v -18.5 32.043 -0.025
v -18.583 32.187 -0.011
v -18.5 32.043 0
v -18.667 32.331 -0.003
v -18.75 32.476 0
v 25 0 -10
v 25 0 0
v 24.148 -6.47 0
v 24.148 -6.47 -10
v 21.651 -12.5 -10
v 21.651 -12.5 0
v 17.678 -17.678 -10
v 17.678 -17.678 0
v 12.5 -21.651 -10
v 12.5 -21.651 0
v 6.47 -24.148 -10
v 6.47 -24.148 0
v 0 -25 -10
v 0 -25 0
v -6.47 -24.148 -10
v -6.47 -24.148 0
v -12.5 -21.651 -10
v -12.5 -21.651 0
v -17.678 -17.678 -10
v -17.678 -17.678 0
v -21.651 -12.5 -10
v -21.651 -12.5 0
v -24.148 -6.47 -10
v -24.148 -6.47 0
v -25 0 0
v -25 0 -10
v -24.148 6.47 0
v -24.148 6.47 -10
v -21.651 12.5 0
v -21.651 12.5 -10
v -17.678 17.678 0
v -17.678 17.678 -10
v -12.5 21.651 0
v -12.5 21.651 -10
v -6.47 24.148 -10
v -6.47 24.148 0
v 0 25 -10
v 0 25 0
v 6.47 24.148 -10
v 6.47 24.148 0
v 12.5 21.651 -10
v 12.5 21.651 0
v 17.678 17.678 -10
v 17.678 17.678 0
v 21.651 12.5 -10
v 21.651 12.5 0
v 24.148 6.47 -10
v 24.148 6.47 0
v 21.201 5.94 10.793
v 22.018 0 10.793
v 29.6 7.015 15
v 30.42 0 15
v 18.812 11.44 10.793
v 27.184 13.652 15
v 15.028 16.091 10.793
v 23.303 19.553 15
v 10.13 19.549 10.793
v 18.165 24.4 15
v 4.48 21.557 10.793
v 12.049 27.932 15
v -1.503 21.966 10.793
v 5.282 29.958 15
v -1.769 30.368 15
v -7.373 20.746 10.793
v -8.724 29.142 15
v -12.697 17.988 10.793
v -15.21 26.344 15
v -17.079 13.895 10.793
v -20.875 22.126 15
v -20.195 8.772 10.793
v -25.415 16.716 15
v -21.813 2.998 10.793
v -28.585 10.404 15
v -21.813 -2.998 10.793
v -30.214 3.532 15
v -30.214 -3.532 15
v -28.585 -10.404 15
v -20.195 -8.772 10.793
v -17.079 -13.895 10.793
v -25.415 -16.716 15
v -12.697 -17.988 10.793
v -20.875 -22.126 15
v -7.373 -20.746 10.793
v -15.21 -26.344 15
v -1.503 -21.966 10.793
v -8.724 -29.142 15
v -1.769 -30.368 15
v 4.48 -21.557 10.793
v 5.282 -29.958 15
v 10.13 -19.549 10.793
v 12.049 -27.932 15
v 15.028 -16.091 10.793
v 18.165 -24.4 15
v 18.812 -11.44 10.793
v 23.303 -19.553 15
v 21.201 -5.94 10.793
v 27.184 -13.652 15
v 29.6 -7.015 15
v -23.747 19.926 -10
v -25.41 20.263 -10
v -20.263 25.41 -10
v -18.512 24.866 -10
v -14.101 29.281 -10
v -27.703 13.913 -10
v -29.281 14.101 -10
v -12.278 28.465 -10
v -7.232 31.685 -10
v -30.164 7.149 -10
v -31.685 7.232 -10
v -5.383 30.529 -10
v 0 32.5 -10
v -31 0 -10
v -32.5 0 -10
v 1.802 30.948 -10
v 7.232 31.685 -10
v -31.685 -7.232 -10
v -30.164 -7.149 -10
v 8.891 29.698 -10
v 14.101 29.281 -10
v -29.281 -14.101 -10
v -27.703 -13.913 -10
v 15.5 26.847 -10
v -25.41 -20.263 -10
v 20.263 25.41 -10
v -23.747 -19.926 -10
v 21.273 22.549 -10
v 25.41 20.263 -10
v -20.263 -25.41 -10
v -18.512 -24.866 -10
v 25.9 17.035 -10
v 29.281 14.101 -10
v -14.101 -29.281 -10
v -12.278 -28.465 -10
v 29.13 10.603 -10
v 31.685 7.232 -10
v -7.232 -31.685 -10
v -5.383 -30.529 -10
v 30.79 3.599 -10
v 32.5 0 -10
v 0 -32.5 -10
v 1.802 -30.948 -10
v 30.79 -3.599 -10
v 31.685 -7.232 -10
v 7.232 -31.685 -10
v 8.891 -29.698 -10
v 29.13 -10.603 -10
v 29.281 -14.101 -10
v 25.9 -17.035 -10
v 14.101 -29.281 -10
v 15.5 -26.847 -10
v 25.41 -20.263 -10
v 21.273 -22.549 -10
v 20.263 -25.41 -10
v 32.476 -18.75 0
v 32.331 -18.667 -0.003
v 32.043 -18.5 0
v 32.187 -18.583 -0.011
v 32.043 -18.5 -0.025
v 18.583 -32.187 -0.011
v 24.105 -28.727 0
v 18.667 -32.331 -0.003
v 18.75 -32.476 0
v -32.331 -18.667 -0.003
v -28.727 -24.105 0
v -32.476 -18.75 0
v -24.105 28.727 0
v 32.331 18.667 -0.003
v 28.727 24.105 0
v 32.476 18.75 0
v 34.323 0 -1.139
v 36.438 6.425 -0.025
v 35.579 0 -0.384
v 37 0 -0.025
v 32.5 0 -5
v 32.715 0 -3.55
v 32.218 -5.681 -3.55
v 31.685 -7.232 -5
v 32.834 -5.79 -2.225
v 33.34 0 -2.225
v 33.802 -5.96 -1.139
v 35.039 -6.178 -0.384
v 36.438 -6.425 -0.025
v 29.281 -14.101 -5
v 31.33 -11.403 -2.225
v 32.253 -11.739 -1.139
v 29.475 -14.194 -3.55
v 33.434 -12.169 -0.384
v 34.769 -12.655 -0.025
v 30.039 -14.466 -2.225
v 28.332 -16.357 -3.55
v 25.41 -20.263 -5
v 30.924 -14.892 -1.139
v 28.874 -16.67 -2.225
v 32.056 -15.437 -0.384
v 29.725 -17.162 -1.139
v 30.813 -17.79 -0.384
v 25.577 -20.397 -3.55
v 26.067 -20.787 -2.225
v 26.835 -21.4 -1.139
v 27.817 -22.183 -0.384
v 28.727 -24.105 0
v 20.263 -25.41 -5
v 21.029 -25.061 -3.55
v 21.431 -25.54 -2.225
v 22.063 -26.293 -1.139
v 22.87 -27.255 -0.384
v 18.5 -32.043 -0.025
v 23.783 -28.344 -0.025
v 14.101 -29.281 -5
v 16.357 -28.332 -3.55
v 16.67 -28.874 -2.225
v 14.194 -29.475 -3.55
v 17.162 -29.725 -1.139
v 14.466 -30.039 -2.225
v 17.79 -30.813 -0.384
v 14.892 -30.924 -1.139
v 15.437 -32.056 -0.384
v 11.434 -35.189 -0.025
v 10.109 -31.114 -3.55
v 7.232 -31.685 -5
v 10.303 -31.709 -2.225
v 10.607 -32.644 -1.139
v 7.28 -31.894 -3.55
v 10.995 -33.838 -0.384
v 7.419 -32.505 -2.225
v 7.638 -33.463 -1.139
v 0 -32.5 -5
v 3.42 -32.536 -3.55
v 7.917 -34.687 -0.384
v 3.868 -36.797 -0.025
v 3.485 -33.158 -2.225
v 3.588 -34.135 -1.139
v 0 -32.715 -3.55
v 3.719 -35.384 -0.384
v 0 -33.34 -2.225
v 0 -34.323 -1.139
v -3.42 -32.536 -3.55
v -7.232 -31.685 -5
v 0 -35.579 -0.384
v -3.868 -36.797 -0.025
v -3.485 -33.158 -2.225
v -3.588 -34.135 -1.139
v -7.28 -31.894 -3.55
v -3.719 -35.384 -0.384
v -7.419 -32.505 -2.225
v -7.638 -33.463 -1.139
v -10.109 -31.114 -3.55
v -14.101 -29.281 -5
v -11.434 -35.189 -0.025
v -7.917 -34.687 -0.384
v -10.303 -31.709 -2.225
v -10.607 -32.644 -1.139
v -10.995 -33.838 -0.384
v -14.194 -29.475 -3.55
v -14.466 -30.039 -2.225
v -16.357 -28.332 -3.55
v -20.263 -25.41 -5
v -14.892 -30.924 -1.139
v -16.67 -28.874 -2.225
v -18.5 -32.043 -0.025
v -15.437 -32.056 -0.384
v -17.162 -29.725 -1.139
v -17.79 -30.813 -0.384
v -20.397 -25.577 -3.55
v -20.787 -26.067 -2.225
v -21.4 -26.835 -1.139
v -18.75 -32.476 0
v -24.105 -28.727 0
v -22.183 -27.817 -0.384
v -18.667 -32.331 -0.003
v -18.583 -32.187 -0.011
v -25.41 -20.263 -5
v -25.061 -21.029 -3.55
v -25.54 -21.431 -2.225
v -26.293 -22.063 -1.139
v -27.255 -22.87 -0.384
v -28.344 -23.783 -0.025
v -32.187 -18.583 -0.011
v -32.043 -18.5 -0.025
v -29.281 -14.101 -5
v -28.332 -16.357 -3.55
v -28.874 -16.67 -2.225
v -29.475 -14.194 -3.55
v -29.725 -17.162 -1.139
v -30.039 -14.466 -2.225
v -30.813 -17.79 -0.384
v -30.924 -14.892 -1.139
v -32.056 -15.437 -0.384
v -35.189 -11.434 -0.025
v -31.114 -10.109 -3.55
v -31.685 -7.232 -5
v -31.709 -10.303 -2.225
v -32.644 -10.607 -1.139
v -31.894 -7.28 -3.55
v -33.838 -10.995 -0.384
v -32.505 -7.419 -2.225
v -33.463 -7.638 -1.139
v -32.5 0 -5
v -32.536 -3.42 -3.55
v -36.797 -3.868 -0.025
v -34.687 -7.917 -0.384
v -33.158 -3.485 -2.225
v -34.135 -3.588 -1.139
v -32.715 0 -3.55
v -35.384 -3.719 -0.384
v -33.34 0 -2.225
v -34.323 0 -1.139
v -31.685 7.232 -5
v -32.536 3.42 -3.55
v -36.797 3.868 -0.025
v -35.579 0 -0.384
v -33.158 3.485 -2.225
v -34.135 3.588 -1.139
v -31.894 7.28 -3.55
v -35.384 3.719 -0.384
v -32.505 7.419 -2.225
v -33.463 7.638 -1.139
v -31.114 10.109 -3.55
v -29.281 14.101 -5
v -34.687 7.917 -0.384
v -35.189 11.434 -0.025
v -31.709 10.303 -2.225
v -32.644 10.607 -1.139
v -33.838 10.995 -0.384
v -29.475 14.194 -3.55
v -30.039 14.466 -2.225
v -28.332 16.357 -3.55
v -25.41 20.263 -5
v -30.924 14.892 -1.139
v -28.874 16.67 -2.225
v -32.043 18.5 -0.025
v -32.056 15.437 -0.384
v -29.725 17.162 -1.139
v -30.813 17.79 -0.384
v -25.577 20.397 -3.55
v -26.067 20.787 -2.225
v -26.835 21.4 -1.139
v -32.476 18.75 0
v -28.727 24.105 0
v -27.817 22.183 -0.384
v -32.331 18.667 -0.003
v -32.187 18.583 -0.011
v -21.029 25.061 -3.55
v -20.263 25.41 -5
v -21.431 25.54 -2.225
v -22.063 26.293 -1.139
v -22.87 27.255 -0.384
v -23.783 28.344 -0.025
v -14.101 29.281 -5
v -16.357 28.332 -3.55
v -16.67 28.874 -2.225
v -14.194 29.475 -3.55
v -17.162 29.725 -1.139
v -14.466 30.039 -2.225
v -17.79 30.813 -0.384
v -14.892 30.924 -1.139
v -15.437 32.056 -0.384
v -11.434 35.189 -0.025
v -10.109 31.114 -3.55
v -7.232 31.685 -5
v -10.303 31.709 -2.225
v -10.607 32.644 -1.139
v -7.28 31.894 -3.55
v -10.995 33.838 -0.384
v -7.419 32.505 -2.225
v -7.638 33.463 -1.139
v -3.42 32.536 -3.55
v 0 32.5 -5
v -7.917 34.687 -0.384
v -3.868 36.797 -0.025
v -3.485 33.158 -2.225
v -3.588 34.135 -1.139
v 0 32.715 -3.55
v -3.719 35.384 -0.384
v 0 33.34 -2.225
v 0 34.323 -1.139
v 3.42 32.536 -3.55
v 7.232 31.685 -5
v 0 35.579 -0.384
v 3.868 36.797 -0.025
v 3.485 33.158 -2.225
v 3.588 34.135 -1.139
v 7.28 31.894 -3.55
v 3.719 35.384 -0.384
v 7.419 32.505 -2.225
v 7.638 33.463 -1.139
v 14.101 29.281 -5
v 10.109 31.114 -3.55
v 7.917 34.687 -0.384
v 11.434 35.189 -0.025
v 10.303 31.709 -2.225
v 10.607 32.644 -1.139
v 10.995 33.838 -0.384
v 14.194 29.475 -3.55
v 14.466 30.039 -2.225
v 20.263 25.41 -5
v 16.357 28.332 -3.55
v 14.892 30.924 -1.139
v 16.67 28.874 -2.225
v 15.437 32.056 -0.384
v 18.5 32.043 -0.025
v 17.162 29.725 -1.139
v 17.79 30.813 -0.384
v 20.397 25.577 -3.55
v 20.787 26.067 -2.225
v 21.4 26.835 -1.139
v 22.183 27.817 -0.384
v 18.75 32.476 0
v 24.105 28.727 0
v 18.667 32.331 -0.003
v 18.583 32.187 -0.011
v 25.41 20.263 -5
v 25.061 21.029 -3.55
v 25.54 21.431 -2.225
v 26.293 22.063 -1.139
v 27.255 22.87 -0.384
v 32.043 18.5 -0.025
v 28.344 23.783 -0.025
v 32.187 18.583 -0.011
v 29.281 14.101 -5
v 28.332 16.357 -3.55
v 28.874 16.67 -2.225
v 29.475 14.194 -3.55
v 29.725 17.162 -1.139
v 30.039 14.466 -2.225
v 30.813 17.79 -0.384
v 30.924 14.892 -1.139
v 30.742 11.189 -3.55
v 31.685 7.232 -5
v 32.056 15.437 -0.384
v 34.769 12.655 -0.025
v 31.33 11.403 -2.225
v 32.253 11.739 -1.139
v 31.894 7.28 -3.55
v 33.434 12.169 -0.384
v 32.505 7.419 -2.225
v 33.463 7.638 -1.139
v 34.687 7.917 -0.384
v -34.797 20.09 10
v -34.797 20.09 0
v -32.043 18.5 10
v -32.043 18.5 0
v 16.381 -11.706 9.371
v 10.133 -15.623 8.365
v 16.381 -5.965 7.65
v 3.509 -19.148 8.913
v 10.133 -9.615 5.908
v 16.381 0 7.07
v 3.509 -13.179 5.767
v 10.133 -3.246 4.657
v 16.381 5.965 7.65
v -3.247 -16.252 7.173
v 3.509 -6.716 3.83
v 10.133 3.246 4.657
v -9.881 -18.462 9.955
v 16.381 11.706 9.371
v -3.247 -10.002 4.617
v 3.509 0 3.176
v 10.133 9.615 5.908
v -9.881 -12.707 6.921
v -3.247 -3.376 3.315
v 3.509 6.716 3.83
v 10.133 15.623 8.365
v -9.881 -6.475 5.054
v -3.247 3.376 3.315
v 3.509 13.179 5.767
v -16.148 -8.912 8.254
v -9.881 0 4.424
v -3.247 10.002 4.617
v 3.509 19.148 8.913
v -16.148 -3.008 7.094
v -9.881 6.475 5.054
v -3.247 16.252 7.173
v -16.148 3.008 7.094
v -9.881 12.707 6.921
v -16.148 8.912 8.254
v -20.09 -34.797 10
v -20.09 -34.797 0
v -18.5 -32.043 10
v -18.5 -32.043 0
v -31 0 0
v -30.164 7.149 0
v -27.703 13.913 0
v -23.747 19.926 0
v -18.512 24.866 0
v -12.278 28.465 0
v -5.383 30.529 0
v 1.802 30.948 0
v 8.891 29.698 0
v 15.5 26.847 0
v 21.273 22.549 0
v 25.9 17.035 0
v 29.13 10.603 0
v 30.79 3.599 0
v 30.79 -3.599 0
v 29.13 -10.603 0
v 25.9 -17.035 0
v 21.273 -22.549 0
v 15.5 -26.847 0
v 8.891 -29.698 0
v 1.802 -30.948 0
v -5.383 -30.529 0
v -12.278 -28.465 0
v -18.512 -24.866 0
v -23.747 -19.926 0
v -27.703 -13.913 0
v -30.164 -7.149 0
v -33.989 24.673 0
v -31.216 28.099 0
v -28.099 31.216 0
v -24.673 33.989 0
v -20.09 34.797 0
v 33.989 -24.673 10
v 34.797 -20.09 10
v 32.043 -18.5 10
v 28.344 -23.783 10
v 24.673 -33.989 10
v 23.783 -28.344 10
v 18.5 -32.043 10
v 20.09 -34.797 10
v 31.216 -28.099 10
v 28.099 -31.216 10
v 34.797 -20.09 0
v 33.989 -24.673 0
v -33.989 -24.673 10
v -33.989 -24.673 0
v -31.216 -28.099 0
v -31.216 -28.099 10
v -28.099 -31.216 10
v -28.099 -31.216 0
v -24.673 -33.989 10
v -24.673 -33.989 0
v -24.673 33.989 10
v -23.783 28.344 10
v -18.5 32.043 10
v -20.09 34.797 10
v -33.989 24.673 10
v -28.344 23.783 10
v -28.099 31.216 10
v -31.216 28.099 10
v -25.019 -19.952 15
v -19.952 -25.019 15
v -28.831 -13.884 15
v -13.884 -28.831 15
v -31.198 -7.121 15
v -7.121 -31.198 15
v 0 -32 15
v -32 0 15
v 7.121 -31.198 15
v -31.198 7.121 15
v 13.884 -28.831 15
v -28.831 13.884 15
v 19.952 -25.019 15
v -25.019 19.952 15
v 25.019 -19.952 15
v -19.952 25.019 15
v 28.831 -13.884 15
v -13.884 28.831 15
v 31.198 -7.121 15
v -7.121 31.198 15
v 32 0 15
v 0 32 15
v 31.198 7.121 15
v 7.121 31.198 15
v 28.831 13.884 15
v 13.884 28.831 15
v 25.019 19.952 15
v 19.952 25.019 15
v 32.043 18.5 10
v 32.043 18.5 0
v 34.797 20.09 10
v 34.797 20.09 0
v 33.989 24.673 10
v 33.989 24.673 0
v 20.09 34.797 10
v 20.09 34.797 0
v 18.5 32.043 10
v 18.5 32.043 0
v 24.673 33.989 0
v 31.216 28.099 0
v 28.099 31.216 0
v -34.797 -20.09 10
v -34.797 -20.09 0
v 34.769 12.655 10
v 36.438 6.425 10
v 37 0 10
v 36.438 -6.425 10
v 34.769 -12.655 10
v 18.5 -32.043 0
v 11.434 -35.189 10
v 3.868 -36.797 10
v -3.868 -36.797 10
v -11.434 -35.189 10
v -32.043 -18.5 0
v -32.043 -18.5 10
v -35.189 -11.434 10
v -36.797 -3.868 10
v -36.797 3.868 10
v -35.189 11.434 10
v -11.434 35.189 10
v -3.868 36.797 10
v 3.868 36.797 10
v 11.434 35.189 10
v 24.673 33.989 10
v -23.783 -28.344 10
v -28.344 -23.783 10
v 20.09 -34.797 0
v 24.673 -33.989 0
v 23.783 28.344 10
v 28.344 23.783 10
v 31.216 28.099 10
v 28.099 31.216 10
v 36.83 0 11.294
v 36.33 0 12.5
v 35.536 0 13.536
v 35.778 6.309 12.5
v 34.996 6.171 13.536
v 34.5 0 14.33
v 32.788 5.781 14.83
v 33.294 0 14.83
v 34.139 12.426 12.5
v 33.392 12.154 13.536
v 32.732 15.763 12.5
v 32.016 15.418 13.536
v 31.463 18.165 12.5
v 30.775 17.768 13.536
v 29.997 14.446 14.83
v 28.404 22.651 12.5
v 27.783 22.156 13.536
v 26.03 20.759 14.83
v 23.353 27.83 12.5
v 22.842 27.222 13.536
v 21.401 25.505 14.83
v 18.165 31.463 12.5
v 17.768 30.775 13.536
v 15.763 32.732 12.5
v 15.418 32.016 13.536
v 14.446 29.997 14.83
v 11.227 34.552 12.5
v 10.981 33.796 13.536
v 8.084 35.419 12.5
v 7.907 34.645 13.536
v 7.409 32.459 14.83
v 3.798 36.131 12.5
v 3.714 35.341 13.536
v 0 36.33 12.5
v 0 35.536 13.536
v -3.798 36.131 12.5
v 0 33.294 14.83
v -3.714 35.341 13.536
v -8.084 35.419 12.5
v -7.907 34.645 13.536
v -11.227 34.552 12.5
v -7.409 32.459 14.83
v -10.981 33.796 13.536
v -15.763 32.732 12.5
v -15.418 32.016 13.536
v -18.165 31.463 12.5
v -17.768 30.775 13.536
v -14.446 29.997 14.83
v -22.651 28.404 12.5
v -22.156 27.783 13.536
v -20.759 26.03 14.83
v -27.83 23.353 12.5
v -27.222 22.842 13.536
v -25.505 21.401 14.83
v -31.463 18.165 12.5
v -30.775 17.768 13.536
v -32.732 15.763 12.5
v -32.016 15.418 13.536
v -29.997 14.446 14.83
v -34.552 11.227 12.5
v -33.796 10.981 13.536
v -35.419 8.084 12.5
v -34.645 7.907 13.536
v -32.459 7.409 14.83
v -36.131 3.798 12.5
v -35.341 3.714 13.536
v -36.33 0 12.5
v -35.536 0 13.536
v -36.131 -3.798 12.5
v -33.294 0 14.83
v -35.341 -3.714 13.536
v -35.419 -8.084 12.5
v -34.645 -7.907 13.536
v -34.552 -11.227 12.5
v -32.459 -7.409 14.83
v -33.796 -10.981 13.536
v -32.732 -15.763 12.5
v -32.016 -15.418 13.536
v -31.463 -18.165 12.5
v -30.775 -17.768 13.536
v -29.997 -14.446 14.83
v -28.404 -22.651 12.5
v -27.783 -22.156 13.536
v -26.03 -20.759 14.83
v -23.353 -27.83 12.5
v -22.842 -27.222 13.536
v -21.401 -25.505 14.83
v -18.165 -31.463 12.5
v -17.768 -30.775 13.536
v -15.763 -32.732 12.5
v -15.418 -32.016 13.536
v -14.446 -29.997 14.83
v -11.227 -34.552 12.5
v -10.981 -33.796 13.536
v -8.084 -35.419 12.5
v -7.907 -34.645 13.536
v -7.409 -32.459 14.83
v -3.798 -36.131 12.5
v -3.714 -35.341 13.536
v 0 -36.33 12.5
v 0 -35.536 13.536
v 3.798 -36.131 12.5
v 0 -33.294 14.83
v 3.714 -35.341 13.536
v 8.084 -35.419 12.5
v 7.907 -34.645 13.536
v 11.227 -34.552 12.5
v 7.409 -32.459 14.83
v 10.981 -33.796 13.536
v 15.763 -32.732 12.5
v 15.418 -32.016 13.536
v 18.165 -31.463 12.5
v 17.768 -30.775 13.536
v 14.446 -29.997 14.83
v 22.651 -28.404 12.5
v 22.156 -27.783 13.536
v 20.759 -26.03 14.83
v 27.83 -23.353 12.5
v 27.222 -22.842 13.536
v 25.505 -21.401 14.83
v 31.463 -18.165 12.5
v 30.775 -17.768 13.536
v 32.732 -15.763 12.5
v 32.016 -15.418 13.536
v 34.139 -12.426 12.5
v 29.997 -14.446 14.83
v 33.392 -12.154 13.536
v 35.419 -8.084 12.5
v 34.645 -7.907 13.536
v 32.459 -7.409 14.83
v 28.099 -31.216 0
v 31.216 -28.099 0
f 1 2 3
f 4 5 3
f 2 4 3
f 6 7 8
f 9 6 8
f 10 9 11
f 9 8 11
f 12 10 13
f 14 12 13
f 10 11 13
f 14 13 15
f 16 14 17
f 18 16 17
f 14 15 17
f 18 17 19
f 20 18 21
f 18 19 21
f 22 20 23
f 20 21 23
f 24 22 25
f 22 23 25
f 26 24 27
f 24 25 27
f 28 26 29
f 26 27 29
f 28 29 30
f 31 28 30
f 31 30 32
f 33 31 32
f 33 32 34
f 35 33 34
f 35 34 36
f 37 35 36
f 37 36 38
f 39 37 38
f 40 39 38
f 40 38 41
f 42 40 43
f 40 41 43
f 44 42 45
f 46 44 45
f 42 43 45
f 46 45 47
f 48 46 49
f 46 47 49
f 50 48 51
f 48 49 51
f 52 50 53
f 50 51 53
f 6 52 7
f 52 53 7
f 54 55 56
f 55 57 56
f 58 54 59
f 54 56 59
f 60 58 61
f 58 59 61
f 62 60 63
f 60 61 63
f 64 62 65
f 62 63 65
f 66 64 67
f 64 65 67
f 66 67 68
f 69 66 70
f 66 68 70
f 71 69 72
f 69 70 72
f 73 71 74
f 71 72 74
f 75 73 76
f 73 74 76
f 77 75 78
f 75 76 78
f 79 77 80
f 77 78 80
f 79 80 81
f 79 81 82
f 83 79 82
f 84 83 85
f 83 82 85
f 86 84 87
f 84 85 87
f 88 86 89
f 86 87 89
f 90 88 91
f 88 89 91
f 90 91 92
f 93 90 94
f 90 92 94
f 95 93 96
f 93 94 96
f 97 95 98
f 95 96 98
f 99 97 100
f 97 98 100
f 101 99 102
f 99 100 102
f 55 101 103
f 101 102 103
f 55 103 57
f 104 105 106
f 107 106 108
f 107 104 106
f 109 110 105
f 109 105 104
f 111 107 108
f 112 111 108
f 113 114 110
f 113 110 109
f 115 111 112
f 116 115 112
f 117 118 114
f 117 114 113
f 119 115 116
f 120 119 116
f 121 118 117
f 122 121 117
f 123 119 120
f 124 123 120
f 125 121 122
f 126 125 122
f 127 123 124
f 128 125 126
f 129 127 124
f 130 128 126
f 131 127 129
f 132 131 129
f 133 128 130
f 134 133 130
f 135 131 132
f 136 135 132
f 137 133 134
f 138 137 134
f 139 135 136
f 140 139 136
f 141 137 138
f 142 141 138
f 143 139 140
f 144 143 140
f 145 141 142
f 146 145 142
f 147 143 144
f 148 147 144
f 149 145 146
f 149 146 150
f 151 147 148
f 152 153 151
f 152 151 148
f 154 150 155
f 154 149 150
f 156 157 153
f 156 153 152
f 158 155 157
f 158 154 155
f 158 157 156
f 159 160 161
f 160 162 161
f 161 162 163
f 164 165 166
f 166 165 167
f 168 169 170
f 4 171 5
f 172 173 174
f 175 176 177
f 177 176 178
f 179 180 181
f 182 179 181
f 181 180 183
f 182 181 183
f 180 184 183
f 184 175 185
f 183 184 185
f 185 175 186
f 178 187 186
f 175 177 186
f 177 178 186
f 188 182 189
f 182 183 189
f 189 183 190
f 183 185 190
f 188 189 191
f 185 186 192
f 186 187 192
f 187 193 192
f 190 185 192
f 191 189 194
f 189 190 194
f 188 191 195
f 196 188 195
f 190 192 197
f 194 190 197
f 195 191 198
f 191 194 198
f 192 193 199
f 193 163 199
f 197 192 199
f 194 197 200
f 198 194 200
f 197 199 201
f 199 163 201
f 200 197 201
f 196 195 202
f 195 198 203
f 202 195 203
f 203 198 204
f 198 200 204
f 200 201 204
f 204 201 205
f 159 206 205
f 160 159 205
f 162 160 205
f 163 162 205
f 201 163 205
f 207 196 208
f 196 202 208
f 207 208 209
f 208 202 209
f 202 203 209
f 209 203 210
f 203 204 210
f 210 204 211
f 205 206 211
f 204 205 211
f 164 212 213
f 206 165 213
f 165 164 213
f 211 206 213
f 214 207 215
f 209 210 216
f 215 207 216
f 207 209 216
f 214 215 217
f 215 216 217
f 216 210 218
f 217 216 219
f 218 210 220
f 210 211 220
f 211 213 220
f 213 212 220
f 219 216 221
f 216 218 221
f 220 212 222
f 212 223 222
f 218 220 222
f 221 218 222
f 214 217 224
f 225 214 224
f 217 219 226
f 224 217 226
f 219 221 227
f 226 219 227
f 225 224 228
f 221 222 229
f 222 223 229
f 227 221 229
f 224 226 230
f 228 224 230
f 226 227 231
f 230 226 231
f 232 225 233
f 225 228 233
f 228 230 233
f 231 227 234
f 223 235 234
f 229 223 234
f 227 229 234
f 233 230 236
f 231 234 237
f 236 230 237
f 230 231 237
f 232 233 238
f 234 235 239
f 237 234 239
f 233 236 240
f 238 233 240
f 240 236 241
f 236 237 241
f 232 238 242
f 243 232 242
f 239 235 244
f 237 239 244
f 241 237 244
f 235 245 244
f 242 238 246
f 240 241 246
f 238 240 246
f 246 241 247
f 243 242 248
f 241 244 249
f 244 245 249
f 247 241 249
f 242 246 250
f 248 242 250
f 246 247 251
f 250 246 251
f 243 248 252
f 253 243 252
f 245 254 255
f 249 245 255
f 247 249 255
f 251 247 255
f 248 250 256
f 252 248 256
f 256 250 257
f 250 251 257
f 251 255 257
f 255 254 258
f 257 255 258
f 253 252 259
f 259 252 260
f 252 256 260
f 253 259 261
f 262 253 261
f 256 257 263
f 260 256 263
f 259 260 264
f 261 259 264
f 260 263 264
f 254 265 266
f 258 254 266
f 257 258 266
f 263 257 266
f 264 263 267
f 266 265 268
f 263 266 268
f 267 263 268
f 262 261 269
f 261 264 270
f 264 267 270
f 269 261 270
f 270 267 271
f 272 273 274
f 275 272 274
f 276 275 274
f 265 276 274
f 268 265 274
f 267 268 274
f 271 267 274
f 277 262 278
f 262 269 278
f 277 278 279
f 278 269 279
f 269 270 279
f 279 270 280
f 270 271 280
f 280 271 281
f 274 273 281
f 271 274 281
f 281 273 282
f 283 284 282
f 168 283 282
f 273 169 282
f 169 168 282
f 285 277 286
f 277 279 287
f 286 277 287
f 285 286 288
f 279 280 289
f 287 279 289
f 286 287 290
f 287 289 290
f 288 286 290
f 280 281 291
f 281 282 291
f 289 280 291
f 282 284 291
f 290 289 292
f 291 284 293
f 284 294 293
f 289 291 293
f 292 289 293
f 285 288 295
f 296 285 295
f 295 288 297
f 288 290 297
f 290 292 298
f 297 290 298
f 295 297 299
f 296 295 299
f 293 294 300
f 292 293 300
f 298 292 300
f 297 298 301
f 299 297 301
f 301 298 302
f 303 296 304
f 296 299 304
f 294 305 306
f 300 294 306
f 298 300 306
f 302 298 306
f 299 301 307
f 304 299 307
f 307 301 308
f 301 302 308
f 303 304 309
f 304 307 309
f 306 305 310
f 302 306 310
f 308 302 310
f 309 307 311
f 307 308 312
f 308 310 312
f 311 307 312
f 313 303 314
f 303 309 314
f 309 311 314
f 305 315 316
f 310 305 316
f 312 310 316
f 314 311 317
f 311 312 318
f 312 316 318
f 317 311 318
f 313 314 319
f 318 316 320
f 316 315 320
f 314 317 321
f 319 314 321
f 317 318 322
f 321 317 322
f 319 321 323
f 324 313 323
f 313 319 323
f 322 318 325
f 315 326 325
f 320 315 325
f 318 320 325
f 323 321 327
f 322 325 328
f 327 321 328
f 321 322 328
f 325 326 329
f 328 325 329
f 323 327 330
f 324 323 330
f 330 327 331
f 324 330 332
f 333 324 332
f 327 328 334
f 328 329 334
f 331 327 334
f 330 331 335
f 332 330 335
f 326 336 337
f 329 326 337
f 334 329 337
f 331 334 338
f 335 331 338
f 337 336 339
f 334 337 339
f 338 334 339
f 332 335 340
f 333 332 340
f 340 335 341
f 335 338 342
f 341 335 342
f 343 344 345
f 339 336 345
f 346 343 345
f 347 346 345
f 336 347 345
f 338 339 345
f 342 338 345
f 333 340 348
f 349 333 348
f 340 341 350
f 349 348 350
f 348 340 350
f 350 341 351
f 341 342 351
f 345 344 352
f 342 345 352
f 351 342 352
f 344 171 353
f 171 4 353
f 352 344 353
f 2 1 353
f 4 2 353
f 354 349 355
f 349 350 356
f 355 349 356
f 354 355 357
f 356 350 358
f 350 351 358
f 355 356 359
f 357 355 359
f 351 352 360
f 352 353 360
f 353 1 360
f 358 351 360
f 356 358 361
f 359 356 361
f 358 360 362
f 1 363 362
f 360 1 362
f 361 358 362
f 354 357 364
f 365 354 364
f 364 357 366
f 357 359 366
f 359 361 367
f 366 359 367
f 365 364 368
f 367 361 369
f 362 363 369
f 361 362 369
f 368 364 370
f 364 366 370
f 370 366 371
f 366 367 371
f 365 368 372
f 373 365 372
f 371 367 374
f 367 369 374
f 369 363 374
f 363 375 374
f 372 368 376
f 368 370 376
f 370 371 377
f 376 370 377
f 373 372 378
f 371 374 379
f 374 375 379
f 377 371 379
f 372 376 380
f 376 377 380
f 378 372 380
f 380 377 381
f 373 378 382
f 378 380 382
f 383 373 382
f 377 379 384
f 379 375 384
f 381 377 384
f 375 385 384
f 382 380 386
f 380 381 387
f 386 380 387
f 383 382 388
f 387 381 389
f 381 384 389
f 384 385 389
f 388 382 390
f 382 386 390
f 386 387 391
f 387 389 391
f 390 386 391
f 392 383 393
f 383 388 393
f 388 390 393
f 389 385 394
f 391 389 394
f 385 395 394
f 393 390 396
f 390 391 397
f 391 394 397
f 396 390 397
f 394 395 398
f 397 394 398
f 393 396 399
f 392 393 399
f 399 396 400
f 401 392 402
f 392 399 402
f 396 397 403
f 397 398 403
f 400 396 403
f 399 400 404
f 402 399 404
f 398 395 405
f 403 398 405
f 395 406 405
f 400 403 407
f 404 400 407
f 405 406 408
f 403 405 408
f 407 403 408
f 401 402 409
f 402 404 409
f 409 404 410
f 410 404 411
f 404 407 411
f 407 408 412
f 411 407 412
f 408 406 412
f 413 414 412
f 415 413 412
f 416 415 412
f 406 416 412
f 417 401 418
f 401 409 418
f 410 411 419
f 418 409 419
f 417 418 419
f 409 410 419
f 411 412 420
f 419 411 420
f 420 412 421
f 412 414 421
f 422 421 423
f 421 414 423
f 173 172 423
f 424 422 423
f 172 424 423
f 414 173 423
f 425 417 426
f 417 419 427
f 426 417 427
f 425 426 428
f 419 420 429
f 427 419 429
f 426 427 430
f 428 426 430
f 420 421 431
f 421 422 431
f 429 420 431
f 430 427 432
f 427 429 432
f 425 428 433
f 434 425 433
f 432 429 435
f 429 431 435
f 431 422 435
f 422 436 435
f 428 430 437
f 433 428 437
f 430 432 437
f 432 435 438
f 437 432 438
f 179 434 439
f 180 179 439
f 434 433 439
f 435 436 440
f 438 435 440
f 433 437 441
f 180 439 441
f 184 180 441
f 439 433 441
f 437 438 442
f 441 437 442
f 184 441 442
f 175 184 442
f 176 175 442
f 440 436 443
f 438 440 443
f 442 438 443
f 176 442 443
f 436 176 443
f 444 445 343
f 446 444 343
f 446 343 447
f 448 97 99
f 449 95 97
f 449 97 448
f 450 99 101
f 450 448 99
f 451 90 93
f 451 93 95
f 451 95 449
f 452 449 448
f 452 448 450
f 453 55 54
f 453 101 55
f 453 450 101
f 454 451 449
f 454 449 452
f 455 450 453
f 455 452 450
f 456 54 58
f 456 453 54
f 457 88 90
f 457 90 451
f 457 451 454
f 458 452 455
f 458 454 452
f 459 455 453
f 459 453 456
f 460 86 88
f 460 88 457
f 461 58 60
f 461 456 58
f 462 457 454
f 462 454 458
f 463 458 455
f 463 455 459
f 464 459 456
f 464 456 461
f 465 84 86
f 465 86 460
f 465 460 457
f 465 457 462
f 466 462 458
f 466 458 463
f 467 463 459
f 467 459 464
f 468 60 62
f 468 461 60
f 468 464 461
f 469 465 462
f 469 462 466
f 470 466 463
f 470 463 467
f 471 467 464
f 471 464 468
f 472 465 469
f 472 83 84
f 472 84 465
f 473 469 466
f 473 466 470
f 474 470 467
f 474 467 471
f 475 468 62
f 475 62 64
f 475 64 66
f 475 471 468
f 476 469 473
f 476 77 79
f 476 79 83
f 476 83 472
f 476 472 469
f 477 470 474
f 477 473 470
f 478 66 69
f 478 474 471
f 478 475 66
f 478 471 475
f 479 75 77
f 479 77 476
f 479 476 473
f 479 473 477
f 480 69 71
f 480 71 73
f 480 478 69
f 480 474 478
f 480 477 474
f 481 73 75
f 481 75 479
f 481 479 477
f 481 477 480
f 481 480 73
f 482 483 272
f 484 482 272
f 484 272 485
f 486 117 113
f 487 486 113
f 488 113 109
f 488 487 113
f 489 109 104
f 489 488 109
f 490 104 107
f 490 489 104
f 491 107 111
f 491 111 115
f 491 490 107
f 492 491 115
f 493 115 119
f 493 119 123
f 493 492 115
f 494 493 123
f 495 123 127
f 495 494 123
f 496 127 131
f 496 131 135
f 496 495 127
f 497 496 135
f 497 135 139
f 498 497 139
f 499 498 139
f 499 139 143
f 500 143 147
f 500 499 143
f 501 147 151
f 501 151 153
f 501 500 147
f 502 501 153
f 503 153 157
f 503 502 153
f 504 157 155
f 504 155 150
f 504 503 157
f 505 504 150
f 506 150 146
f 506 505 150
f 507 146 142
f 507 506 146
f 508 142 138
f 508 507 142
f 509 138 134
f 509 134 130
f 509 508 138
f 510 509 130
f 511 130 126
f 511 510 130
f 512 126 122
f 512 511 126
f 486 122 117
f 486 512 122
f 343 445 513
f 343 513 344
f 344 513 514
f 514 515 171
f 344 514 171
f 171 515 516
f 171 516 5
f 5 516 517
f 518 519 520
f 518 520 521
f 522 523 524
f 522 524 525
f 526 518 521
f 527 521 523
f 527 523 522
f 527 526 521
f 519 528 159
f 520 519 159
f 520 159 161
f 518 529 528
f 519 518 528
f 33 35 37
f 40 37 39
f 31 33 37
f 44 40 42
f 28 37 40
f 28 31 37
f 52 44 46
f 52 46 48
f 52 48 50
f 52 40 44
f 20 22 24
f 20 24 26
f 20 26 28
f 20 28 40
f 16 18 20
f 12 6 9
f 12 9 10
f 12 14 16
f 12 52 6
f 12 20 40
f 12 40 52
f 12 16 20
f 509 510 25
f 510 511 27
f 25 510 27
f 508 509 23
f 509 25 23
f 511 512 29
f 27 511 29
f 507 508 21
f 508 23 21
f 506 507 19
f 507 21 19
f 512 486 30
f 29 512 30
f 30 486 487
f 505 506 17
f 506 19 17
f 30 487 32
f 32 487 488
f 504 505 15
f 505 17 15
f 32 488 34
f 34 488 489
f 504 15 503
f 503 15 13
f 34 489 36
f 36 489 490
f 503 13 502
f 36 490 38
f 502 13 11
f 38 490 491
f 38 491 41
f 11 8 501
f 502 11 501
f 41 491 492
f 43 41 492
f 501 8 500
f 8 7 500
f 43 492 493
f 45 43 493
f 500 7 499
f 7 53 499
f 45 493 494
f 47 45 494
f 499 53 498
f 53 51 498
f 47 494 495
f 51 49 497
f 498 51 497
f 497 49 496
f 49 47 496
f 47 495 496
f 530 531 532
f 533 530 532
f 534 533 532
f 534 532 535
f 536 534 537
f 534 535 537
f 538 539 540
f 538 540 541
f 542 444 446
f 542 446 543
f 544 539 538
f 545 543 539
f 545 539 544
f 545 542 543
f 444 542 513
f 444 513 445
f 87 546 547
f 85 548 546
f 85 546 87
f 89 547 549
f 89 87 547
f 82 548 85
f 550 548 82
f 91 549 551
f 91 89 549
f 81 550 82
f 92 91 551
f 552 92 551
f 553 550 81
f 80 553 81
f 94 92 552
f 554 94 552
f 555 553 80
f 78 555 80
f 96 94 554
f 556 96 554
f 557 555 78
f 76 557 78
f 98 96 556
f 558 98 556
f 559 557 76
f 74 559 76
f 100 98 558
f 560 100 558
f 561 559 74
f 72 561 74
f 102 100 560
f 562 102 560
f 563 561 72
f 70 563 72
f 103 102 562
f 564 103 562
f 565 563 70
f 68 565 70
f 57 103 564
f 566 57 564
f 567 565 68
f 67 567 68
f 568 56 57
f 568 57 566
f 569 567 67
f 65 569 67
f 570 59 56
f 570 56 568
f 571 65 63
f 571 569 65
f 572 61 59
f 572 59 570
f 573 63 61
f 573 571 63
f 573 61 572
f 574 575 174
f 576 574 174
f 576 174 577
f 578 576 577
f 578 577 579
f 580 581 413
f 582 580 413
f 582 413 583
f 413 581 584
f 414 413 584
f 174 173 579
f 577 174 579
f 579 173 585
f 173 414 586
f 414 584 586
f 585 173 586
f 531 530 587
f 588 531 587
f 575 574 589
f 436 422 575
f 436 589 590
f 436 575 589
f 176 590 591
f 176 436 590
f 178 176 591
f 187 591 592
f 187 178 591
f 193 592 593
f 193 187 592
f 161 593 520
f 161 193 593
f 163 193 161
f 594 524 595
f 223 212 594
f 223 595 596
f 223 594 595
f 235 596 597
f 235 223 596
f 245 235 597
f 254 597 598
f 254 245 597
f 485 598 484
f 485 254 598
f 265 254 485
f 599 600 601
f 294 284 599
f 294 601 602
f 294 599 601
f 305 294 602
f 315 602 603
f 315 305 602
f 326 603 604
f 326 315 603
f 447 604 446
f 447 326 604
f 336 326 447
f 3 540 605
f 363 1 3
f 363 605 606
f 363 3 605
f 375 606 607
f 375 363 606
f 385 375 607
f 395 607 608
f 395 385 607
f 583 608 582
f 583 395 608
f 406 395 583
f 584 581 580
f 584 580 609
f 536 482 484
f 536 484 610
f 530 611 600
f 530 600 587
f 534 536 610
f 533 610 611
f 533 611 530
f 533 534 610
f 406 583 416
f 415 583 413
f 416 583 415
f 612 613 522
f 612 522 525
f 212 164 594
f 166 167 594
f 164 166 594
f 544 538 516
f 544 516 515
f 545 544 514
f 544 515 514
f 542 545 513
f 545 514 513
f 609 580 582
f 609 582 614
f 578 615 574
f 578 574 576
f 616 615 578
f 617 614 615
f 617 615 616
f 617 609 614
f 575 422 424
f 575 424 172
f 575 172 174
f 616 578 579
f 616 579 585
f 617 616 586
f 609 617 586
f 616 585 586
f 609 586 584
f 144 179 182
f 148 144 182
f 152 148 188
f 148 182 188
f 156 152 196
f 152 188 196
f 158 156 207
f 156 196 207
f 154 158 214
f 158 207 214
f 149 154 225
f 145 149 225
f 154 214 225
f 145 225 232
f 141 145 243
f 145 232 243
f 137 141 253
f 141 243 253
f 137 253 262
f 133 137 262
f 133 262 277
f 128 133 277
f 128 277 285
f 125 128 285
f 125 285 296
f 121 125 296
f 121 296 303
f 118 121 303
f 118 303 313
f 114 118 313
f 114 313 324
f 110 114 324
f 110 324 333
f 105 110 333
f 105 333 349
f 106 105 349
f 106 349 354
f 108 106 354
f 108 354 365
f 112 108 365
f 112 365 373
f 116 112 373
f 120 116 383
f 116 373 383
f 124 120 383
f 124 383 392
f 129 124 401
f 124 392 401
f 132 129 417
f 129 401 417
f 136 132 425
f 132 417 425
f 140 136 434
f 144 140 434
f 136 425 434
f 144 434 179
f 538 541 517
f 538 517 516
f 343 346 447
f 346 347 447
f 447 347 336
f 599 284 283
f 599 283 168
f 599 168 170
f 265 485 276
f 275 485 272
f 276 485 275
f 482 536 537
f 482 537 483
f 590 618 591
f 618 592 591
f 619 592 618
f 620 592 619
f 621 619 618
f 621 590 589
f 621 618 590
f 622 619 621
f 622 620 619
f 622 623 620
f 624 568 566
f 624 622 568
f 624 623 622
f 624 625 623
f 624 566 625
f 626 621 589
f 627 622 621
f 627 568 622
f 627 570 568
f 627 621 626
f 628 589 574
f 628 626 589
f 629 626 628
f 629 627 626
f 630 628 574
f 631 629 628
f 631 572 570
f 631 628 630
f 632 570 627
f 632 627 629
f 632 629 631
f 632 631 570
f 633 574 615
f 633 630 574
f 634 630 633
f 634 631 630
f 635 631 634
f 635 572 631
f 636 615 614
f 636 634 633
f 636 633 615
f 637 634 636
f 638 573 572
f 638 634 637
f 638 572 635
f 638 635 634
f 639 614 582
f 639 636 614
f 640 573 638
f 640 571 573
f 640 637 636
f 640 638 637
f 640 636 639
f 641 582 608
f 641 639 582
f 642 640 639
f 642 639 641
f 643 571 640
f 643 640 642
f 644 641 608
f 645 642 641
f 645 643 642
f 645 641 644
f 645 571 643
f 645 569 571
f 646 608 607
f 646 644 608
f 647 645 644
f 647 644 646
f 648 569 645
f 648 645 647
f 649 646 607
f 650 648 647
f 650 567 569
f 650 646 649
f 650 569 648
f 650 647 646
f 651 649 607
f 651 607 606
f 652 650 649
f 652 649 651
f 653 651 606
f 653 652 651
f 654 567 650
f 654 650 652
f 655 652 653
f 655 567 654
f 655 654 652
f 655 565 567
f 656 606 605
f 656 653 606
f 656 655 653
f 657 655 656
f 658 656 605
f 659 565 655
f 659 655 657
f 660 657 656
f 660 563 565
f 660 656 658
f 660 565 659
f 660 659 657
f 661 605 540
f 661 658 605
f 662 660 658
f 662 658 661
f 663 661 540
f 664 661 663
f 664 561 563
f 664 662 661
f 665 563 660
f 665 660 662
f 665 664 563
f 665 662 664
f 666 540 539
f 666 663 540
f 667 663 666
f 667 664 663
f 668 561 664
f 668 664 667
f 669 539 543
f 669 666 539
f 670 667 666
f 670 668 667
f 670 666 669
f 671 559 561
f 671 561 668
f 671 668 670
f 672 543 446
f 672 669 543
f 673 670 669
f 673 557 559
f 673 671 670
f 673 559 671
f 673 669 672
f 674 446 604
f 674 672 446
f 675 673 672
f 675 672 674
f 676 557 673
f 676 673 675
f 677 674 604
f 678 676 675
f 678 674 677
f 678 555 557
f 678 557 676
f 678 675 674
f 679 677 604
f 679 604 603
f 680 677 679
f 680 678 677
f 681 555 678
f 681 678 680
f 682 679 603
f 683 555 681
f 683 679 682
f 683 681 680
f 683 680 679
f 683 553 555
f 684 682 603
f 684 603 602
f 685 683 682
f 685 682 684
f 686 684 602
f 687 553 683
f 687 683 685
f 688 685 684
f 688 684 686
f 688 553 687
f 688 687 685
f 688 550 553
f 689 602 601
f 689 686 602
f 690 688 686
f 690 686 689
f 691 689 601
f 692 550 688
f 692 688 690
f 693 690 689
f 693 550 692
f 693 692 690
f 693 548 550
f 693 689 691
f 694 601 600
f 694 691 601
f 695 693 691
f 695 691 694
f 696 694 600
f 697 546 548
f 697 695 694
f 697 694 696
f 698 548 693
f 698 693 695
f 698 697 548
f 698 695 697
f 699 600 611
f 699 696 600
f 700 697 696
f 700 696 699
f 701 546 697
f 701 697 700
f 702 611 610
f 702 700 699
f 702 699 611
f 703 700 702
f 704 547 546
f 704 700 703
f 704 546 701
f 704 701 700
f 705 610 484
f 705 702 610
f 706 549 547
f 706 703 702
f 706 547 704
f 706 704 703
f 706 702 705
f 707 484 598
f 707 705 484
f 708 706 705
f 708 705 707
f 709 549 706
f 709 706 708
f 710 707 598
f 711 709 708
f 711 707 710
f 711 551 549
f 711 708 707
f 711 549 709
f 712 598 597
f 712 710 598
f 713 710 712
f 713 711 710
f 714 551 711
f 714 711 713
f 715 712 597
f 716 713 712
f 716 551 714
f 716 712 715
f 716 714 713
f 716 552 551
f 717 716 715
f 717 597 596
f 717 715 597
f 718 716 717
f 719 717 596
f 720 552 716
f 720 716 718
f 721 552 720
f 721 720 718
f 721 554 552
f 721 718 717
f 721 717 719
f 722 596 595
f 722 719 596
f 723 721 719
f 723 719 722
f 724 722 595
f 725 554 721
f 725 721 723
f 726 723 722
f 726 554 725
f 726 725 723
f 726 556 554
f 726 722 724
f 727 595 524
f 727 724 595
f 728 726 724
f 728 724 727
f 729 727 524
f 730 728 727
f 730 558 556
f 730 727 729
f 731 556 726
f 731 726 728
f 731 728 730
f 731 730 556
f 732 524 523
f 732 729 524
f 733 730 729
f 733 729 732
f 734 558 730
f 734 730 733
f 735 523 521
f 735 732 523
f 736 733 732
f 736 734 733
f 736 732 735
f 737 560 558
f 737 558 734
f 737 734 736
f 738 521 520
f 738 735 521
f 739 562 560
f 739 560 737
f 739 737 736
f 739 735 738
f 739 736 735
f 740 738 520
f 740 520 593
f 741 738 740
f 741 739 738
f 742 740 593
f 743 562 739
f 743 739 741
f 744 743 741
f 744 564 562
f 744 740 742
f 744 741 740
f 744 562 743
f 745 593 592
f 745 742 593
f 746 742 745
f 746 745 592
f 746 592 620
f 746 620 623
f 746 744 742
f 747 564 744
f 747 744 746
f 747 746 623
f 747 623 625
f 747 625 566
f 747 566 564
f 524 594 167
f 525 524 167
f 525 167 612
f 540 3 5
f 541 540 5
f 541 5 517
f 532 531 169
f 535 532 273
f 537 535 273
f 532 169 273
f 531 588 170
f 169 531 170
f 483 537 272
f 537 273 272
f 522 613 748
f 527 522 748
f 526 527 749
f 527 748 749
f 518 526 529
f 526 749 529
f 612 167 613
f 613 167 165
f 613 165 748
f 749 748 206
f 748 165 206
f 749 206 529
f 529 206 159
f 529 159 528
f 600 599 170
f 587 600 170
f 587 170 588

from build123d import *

# Parameters (mm, degrees)
SKETCH_1_R                           = 37
EXTRUDE_1_DEPTH                      = 15
FILLET_2_R                           = 5
EXTRUDE_3_DEPTH                      = 10
CHAMFER_2_SIZE                       = 1.819851171
CHAMFER_3_SIZE                       = 1.819851171
PATTERN_CIRCULAR_4_COUNT             = 4
CHAMFER_2_OF_PATTERN_CIRCULAR_4_SIZE = 1.819851171
CHAMFER_3_OF_PATTERN_CIRCULAR_4_SIZE = 1.819851171
SKETCH_9_R                           = 32.5
SKETCH_9_R_2                         = 31
EXTRUDE_4_DEPTH                      = 10
SKETCH_9_3_R                         = 25
EXTRUDE_5_DEPTH                      = 10
FILLET_3_R                           = 5


with BuildPart() as part:
    # 草圖1 → 填料-伸長1 (new body)
    with BuildSketch(Plane.XY):
        Circle(SKETCH_1_R)
    extrude(amount=EXTRUDE_1_DEPTH)

    # 草圖2 → 除料-旋轉2 (revolve, cut)
    with BuildSketch(Plane.XY.offset(38)):
        with BuildLine():
            Line((-35, 0), (35, 0))
            ThreePointArc((35, 0), (0, -35), (-35, 0))
        make_face()
    revolve(axis=Axis((-35, 0, 38), (1, 0, 0)), mode=Mode.SUBTRACT)

    # 導角1: read off the stored shape, not the designer's step
    # 導角1 outline → 導角1 (revolve, cut)
    with BuildSketch(Plane.XZ):
        Polygon((22.017739237, 15), (22.017739237, 10.79303106), (30.419689063, 15), align=None)
    revolve(axis=Axis((0, 0, 0), (0, 0, 1)), mode=Mode.SUBTRACT)

    # 圓角2
    fillet_2_edges = [part.edges().sort_by_distance(p)[0] for p in [
        (-37, 0, 15),
    ]]
    fillet(fillet_2_edges, radius=FILLET_2_R)

    # 草圖8 → 填料-伸長3 (add)
    with BuildSketch(Plane.XY):
        with BuildLine():
            Line((21, 36.373066959), (18.5, 32.04293994))
            ThreePointArc((18.5, 32.04293994), (26.162950904, 26.162950904), (32.04293994, 18.5))
            Line((32.04293994, 18.5), (36.373066959, 21))
            ThreePointArc((36.373066959, 21), (29.69848481, 29.69848481), (21, 36.373066959))
        make_face()
    extrude_3 = extrude(amount=EXTRUDE_3_DEPTH)

    # 導角2
    # the kernel refuses this chamfer: 5, 1.819851171 mm, written as the material it takes off along each edge
    with BuildSketch(Plane(origin=(21, 36.373066959, -11.408988882), x_dir=(-0.5000000000000003, -0.8660254037844385, 0), z_dir=(0, 0, 1))) as chamfer_2_piece_1:
        with BuildLine():
            Line((CHAMFER_2_SIZE, 0), (0.22826162, 4.372856354))
            ThreePointArc((0.22826162, 4.372856354), (0.06200601, 2.281372415), (0, 0))
            Line((0, 0), (CHAMFER_2_SIZE, 0))
        make_face()
    extrude(amount=32.817977764, mode=Mode.SUBTRACT)

    # 導角3
    # the kernel refuses this chamfer: 5, 1.819851171 mm, written as the material it takes off along each edge
    with BuildSketch(Plane(origin=(36.373066959, 21, -11.408988882), x_dir=(-0.8660254037844387, -0.5000000000000001, 0), z_dir=(0, 0, 1))) as chamfer_3_piece_1:
        with BuildLine():
            Line((CHAMFER_3_SIZE, 0), (0.22826162, -4.372856354))
            ThreePointArc((0.22826162, -4.372856354), (0.06200601, -2.281372415), (0, 0))
            Line((0, 0), (CHAMFER_3_SIZE, 0))
        make_face()
    extrude(amount=32.817977764, mode=Mode.SUBTRACT)

    # 環狀複製排列4: 填料-伸長3 ×4 about axis
    pattern_circular_4_axis = Axis((0, 0, 0), (0, 0, 1))
    for i in range(1, PATTERN_CIRCULAR_4_COUNT):
        add(extrude_3.rotate(pattern_circular_4_axis, i * 360 / PATTERN_CIRCULAR_4_COUNT))

    # 導角2 of 環狀複製排列4
    # the kernel refuses this chamfer: 5, 1.819851171 mm, written as the material it takes off along each edge
    with BuildSketch(Plane(origin=(-36.373066959, 21, -11.408988882), x_dir=(0.5444649568890038, 0.8387835899204604, 0), z_dir=(0, 0, 1)), Plane(origin=(-21, -36.373066959, -11.408988882), x_dir=(-0.8387835899204604, 0.5444649568890038, 0), z_dir=(0, 0, 1)), Plane(origin=(36.373066959, -21, -11.408988882), x_dir=(-0.5444649568890034, -0.8387835899204606, 0), z_dir=(0, 0, 1))) as chamfer_2_of_pattern_circular_4_piece_1:
        with BuildLine():
            Line((4.378809891, 0), (CHAMFER_2_OF_PATTERN_CIRCULAR_4_SIZE * 0.0521286891855, -CHAMFER_2_OF_PATTERN_CIRCULAR_4_SIZE * 0.998640375775))
            Line((CHAMFER_2_OF_PATTERN_CIRCULAR_4_SIZE * 0.0521286891855, -CHAMFER_2_OF_PATTERN_CIRCULAR_4_SIZE * 0.998640375775), (0, 0))
            ThreePointArc((0, 0), (2.281502898, 0.057003248), (4.378809891, 0))
        make_face()
    extrude(amount=32.817977764, mode=Mode.SUBTRACT)

    # 導角3 of 環狀複製排列4
    # the kernel refuses this chamfer: 5, 1.819851171 mm, written as the material it takes off along each edge
    with BuildSketch(Plane(origin=(-21, 36.373066959, -11.408988882), x_dir=(0.5000000000000001, -0.8660254037844387, 0), z_dir=(0, 0, 1))) as chamfer_3_of_pattern_circular_4_piece_1:
        with BuildLine():
            Line((CHAMFER_3_OF_PATTERN_CIRCULAR_4_SIZE, 0), (0.22826162, -4.372856354))
            ThreePointArc((0.22826162, -4.372856354), (0.06200601, -2.281372415), (0, 0))
            Line((0, 0), (CHAMFER_3_OF_PATTERN_CIRCULAR_4_SIZE, 0))
        make_face()
    extrude(amount=32.817977764, mode=Mode.SUBTRACT)
    with BuildSketch(Plane(origin=(-36.373066959, -21, -11.408988882), x_dir=(0.5444649568890013, -0.8387835899204622, 0), z_dir=(0, 0, 1)), Plane(origin=(21, -36.373066959, -11.408988882), x_dir=(0.8387835899204622, 0.5444649568890012, 0), z_dir=(0, 0, 1))) as chamfer_3_of_pattern_circular_4_piece_2:
        with BuildLine():
            Line((4.378809891, 0), (CHAMFER_3_OF_PATTERN_CIRCULAR_4_SIZE * 0.0521286891855, CHAMFER_3_OF_PATTERN_CIRCULAR_4_SIZE * 0.998640375775))
            Line((CHAMFER_3_OF_PATTERN_CIRCULAR_4_SIZE * 0.0521286891855, CHAMFER_3_OF_PATTERN_CIRCULAR_4_SIZE * 0.998640375775), (0, 0))
            ThreePointArc((0, 0), (2.281502898, -0.057003248), (4.378809891, 0))
        make_face()
    extrude(amount=32.817977764, mode=Mode.SUBTRACT)

    # 草圖9 → 填料-伸長4 (add)
    with BuildSketch(Plane(origin=(0, 0, 0), x_dir=(-1, 0, 0), z_dir=(0, 0, -1))):
        with Locations(Location((0, 0, 0), (0, 0, 180))):
            Circle(SKETCH_9_R)
        Circle(SKETCH_9_R_2, mode=Mode.SUBTRACT)
    extrude(amount=EXTRUDE_4_DEPTH)

    # 草圖9<3> → 填料-伸長5 (add)
    with BuildSketch(Plane(origin=(0, 0, 0), x_dir=(-1, 0, 0), z_dir=(0, 0, -1))):
        with Locations(Location((0, 0, 0), (0, 0, 180))):
            Circle(SKETCH_9_3_R)
    extrude(amount=EXTRUDE_5_DEPTH)

    # 圓角3
    # the kernel refuses this fillet: 5 mm, written as the material it adds along each edge
    with BuildSketch(Plane(origin=(0, 0, 0), x_dir=(1, 0, 0), z_dir=(0, 1, 0))) as fillet_3_piece_1_section:
        with BuildLine():
            CenterArc((32.5 + FILLET_3_R, FILLET_3_R), FILLET_3_R, 180, 90)
            Line((32.5, FILLET_3_R), (32.5, 0))
            Line((32.5, 0), (32.5 + FILLET_3_R, 0))
        make_face()
    fillet_3_piece_1 = revolve(axis=Axis((0, 0, 0), (0, 0, -1)), mode=Mode.PRIVATE)
    fillet_3_piece_1 = fillet_3_piece_1 & Plane(origin=(0, 0, 0), x_dir=(1, 0, 0), z_dir=(0, 0, -1)) * Cylinder(37, 150, mode=Mode.PRIVATE)
    add(fillet_3_piece_1)
    with BuildSketch(Plane(origin=(0, 0, 0), x_dir=(1, 0, 0), z_dir=(0, 1, 0))) as fillet_3_piece_2_section:
        with BuildLine():
            CenterArc((32.5 + FILLET_3_R, FILLET_3_R), FILLET_3_R, 180, 90)
            Line((32.5, FILLET_3_R), (32.5, 0))
            Line((32.5, 0), (32.5 + FILLET_3_R, 0))
        make_face()
    fillet_3_piece_2 = revolve(axis=Axis((0, 0, 0), (0, 0, -1)), mode=Mode.PRIVATE)
    fillet_3_piece_2 = split(fillet_3_piece_2, bisect_by=Plane(origin=(0, 0, 0), z_dir=(0.8660254037844387, 0.5000000000000001, 0)), keep=Keep.TOP, mode=Mode.PRIVATE)
    fillet_3_piece_2 = split(fillet_3_piece_2, bisect_by=Plane(origin=(0, 0, 0), z_dir=(-0.4999999999999997, -0.8660254037844389, 0)), keep=Keep.TOP, mode=Mode.PRIVATE)
    add(fillet_3_piece_2)
    with BuildSketch(Plane(origin=(0, 0, 0), x_dir=(1, 0, 0), z_dir=(0, 1, 0))) as fillet_3_piece_3_section:
        with BuildLine():
            CenterArc((32.5 + FILLET_3_R, FILLET_3_R), FILLET_3_R, 180, 90)
            Line((32.5, FILLET_3_R), (32.5, 0))
            Line((32.5, 0), (32.5 + FILLET_3_R, 0))
        make_face()
    fillet_3_piece_3 = revolve(axis=Axis((0, 0, 0), (0, 0, -1)), mode=Mode.PRIVATE)
    fillet_3_piece_3 = split(fillet_3_piece_3, bisect_by=Plane(origin=(0, 0, 0), z_dir=(0.8660254037844388, -0.4999999999999997, 0)), keep=Keep.TOP, mode=Mode.PRIVATE)
    fillet_3_piece_3 = split(fillet_3_piece_3, bisect_by=Plane(origin=(0, 0, 0), z_dir=(-0.5000000000000001, 0.8660254037844386, 0)), keep=Keep.TOP, mode=Mode.PRIVATE)
    add(fillet_3_piece_3)
    with BuildSketch(Plane(origin=(0, 0, 0), x_dir=(1, 0, 0), z_dir=(0, 1, 0))) as fillet_3_piece_4_section:
        with BuildLine():
            CenterArc((32.5 + FILLET_3_R, FILLET_3_R), FILLET_3_R, 180, 90)
            Line((32.5, FILLET_3_R), (32.5, 0))
            Line((32.5, 0), (32.5 + FILLET_3_R, 0))
        make_face()
    fillet_3_piece_4 = revolve(axis=Axis((0, 0, 0), (0, 0, -1)), mode=Mode.PRIVATE)
    fillet_3_piece_4 = split(fillet_3_piece_4, bisect_by=Plane(origin=(0, 0, 0), z_dir=(-0.8660254037844388, 0.4999999999999997, 0)), keep=Keep.TOP, mode=Mode.PRIVATE)
    fillet_3_piece_4 = split(fillet_3_piece_4, bisect_by=Plane(origin=(0, 0, 0), z_dir=(0.5000000000000001, -0.8660254037844386, 0)), keep=Keep.TOP, mode=Mode.PRIVATE)
    add(fillet_3_piece_4)
    with BuildSketch(Plane(origin=(0, 0, 0), x_dir=(1, 0, 0), z_dir=(0, 1, 0))) as fillet_3_piece_5_section:
        with BuildLine():
            CenterArc((32.5 + FILLET_3_R, FILLET_3_R), FILLET_3_R, 180, 90)
            Line((32.5, FILLET_3_R), (32.5, 0))
            Line((32.5, 0), (32.5 + FILLET_3_R, 0))
        make_face()
    fillet_3_piece_5 = revolve(axis=Axis((0, 0, 0), (0, 0, -1)), mode=Mode.PRIVATE)
    fillet_3_piece_5 = split(fillet_3_piece_5, bisect_by=Plane(origin=(0, 0, 0), z_dir=(-0.8660254037844387, -0.5000000000000001, 0)), keep=Keep.TOP, mode=Mode.PRIVATE)
    fillet_3_piece_5 = split(fillet_3_piece_5, bisect_by=Plane(origin=(0, 0, 0), z_dir=(0.4999999999999997, 0.8660254037844389, 0)), keep=Keep.TOP, mode=Mode.PRIVATE)
    add(fillet_3_piece_5)


solid = part.part
